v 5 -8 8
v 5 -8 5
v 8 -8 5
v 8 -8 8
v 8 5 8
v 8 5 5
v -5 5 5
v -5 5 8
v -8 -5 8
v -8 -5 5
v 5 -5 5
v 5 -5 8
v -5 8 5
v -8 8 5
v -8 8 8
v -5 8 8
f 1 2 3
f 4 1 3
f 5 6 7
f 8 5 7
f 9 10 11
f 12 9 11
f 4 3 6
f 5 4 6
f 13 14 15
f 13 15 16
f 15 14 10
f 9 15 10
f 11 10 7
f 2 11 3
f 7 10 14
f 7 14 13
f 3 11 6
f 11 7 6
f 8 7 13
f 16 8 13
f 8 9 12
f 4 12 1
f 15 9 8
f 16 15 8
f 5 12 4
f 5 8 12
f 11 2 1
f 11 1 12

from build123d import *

# Parameters (mm, degrees)
F3_W     = 3
F3_H     = 5
F3_H_2   = 3
F4_DEPTH = 3


with BuildPart() as f4:
    # F3 (on face) → F4 (new body)
    with BuildSketch(Plane.XY.offset(5)):
        Polygon((-5, 0), (-5, -5), (0, -5), (5, -5), (5, 0), (5, 5), (0, 5), (-5, 5), align=None)
        with Locations((-6.5, 2.5)):
            Rectangle(F3_W, F3_H)
        with Locations((-6.5, 6.5)):
            Rectangle(F3_W, F3_H_2)
        with Locations((6.5, -2.5)):
            Rectangle(F3_W, F3_H)
        with Locations((6.5, -6.5)):
            Rectangle(F3_W, F3_H_2)
        with Locations((-6.5, -2.5)):
            Rectangle(F3_W, F3_H)
        with Locations((6.5, 2.5)):
            Rectangle(F3_W, F3_H)
    extrude(amount=F4_DEPTH)


solid = f4.part
